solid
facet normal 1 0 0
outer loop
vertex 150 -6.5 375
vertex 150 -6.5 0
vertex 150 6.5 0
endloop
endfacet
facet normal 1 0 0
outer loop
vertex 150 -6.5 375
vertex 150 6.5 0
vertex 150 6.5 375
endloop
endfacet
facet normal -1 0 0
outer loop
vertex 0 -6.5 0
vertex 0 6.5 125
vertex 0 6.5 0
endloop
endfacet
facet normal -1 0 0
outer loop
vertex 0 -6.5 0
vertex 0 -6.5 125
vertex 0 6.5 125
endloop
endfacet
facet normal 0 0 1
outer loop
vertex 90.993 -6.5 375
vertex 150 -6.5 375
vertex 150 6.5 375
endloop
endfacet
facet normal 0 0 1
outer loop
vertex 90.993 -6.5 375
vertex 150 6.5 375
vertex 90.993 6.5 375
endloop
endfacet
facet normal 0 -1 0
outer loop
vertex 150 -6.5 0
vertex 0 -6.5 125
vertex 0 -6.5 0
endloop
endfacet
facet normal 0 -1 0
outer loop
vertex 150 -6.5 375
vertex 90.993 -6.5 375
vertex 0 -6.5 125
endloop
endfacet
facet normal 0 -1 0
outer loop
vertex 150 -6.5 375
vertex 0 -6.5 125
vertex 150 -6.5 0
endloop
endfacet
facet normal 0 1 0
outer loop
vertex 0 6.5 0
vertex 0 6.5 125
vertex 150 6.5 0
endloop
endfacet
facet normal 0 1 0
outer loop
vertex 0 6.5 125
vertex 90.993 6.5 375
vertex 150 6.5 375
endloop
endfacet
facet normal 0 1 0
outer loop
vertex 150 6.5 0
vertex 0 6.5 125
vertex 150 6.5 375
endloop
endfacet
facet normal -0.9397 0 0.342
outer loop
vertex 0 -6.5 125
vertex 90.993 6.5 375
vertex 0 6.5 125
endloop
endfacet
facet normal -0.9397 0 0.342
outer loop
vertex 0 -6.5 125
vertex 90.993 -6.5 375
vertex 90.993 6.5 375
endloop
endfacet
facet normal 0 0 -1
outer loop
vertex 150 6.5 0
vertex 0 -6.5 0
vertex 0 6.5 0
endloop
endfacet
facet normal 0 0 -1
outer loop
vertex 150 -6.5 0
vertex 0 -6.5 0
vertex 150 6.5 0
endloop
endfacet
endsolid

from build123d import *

# Parameters (mm, degrees)
PAD_DEPTH = 6.5


with BuildPart() as part:
    # Sketch → Pad (new body, symmetric)
    with BuildSketch(Plane.XZ):
        Polygon((0, 0), (150, 0), (150, 375), (90.992559, 375), (0, 125), align=None)
    extrude(amount=PAD_DEPTH, both=True)


solid = part.part
